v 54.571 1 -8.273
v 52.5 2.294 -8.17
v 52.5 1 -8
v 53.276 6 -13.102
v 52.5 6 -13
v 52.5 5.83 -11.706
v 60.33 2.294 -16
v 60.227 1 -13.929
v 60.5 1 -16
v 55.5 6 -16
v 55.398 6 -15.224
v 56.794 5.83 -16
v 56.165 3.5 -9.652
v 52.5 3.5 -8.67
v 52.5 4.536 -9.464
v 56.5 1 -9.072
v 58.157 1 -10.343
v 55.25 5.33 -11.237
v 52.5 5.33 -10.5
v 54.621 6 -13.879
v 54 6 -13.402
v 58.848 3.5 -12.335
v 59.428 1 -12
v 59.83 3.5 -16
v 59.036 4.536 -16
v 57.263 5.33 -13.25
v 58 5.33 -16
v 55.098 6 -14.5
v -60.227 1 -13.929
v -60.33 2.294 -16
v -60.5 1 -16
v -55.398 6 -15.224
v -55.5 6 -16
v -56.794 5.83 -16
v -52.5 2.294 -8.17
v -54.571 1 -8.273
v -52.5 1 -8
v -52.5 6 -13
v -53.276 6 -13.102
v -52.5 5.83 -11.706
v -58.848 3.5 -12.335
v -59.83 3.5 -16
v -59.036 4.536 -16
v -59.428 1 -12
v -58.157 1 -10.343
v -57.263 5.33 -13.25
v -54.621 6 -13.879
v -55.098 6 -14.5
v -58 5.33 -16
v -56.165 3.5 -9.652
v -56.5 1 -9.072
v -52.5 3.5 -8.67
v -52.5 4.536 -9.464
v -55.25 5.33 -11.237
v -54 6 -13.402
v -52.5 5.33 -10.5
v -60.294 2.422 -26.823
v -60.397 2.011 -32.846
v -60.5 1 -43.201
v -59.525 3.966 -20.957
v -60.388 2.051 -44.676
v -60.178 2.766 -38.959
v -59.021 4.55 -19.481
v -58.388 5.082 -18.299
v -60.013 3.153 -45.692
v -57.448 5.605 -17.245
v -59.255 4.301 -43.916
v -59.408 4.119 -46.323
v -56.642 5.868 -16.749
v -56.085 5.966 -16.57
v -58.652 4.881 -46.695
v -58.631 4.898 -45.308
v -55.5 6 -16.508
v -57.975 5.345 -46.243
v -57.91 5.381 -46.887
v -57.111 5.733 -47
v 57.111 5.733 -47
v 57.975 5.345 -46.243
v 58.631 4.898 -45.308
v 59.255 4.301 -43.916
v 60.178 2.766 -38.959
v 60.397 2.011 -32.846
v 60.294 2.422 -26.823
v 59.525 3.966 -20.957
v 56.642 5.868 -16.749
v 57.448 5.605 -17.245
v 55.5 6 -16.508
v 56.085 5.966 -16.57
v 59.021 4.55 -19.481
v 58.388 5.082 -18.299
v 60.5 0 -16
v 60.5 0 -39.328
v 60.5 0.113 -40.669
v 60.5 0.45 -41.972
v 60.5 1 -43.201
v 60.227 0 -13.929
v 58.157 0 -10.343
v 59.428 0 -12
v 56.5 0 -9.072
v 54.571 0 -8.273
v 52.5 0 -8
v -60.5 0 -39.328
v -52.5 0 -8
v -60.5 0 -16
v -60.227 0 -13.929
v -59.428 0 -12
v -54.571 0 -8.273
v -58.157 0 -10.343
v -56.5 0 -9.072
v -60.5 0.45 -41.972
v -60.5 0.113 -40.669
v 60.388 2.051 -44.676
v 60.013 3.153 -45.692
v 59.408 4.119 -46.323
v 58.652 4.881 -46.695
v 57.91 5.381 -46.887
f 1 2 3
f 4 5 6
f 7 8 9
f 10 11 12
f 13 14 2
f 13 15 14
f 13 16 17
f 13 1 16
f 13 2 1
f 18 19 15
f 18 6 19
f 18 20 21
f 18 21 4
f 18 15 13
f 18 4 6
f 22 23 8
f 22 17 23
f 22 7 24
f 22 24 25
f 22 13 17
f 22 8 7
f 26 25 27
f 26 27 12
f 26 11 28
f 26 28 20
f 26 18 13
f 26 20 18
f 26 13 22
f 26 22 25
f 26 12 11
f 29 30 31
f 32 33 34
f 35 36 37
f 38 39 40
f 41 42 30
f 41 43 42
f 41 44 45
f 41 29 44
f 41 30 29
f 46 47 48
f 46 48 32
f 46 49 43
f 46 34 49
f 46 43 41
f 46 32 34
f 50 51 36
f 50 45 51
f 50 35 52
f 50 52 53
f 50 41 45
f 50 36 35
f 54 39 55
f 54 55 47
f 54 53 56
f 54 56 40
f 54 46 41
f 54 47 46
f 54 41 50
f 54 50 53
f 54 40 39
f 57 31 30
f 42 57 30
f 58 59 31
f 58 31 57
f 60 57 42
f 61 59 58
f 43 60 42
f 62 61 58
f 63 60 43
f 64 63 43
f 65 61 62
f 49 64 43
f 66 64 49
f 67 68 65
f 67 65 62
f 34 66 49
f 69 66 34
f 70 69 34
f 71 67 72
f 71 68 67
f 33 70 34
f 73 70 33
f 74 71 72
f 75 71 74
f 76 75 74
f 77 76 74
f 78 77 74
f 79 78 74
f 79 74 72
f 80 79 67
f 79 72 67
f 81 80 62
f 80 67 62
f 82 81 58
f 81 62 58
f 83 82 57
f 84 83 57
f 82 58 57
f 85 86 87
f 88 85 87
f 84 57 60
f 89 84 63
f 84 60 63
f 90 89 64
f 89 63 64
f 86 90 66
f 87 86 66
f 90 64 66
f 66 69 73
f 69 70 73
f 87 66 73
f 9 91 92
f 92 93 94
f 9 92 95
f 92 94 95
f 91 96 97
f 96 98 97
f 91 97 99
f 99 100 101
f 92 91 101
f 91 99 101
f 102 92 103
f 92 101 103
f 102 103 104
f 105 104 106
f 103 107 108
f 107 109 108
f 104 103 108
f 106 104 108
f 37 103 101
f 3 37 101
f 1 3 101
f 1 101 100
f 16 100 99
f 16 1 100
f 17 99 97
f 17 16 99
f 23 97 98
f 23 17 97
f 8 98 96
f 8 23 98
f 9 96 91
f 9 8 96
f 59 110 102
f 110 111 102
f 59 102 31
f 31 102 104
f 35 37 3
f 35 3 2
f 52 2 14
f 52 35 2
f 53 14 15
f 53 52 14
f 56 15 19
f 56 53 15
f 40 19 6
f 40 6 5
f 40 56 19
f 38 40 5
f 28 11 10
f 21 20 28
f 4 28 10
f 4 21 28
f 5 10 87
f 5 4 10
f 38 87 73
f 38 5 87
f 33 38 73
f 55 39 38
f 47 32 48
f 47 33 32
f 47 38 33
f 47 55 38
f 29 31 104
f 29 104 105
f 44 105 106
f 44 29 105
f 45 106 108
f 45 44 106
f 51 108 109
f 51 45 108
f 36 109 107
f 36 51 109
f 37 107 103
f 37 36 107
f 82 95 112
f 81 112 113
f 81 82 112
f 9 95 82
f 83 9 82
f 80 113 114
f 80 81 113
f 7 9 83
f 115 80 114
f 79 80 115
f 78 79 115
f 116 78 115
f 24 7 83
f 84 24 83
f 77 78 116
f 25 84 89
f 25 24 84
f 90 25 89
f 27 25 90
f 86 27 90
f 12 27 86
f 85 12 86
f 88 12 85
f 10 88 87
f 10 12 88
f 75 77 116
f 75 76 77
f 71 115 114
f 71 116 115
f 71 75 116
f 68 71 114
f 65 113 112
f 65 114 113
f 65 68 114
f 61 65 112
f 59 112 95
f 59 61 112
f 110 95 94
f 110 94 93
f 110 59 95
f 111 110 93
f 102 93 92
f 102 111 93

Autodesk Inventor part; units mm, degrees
ref_plane "YZ Plane" through (0, 0, 0) normal (1, 0, 0) x (0, 1, 0)
ref_plane "XZ Plane" through (0, 0, 0) normal (0, 1, 0) x (-1, 0, 0)
ref_plane "XY Plane" through (0, 0, 0) normal (0, 0, 1) x (1, 0, 0)
sketch "Sketch1" plane through (0, 0, 0) normal (0, 1, 0) x (-1, 0, 0)
  line L0 (25.9, 0) -> (-25.9, 0) projected
  line L1 (0, -25.9) -> (0, 25.9) projected
  circle A0 centre (0, 0) radius 18.5 construction
  circle A1 centre (0, 0) radius 13 construction
  dimension "d0" = 37
  dimension "d1" = 26
sketch "Sketch2" plane through (0, 0, 0) normal (0, 1, 0) x (-1, 0, 0)
  line L0 (0, -28.9) -> (0, 26.4) projected
  line L1 (-60.5, -8) -> (-60.5, -21)
  line L2 (-60.5, -21) -> (60.5, -21)
  line L3 (60.5, -21) -> (60.5, -8)
  line L4 (60.5, -8) -> (-60.5, -8)
  line L5 (-84.7, 0) -> (84.7, 0) projected
  point P0 (0, 0)
  dimension "d3" = 121
  dimension "d99" = 8
  dimension "d101" = 21
extrude "Extrusion1" add sketch "Sketch2" along normal blind 6
sketch "Sketch6" plane through (0, 0, 0) normal (0, 1, 0) x (-1, 0, 0)
  line L0 (60.5, -21) -> (-60.5, -21) projected
  line L1 (60.5, -8) -> (60.5, -21) projected
  line L2 (-60.5, -21) -> (60.5, -21)
  line L3 (60.5, -21) -> (60.5, -8)
  line L4 (-60.5, -8) -> (-60.5, -21)
  line L5 (84.7, 0) -> (-84.7, 0) projected
  line L6 (0, -28.9) -> (0, 26.4) projected
  arc A0 (-16, 0) -> (16, 0) centre (0, 0) ccw
  line L7 (16, 0) -> (16, 0)
  line L8 (60.5, 0) -> (-60.5, 0) projected
  line L9 (16, 0) -> (60.5, 0)
  line L10 (-16, 0) -> (-16, 0)
  line L11 (-16, 0) -> (-60.5, 0)
  point P0 (-17.3617, -21)
  dimension "d18" = 32
extrude "Extrusion5" [suppressed]
sketch "Sketch4" plane through (0, 0, 0) normal (0, 0, 1) x (1, 0, 0)
  line L0 (-18.5, 0) -> (18.5, 0)
  line L1 (18.5, 0) -> (18.5, -2)
  line L2 (18.5, -2) -> (-18.5, -2)
  line L3 (-18.5, -2) -> (-18.5, 0)
  line L4 (-25.9, 0) -> (25.9, 0) projected
  line L5 (0, -2.4) -> (0, 0.4) projected
  point P0 (0, 0)
  dimension "d10" = 37
  dimension "d11" = 2
extrude "Extrusion6" [suppressed]
sketch "Sketch5" plane through (0, 0, 0) normal (0, 1, 0) x (-1, 0, 0)
  circle A0 centre (0, 0) radius 18.5 construction
  circle A1 centre (0, 0) radius 18.5 construction
  line L0 (25.9, 0) -> (-25.9, 0) projected
  line L1 (0, -28.9) -> (0, 26.4) projected
  line L2 (-18.5, -21) -> (18.5, -21)
  line L3 (18.5, -21) -> (18.5, -18.5)
  line L4 (18.5, -18.5) -> (-18.5, -18.5)
  line L5 (-18.5, -18.5) -> (-18.5, -21)
  dimension "d25" = 37
  dimension "d26" = 21
extrude "Extrusion7" [suppressed]
sketch "Sketch7" plane through (0, 0, 0) normal (0, 0, 1) x (1, 0, 0)
  line L0 (-18.5, 0) -> (18.5, 0)
  line L1 (18.5, 0) -> (18.5, -2)
  line L2 (18.5, -2) -> (-18.5, -2)
  line L3 (-18.5, -2) -> (-18.5, 0)
  line L4 (60.5, 0) -> (-60.5, 0) projected
  line L5 (-84.7, 0) -> (84.7, 0) projected
  line L6 (0, -2.4) -> (0, 0.4) projected
  point P0 (-16, 0)
  point P1 (16, 0)
  dimension "d53" = 2
  dimension "d54" = 18.5
extrude "Extrusion8" [suppressed]
sketch "Sketch8" plane through (0, 0, 0) normal (0, 1, 0) x (-1, 0, 0)
  circle A0 centre (0, 0) radius 12.75
  dimension "d34" = 25.5
extrude "Extrusion9" [suppressed]
pattern_linear "Rectangular Pattern1" [suppressed]
sketch "Sketch9" plane through (0, 6, 0) normal (0, 1, 0) x (1, 0, 0)
  circle A0 centre (0, 0) radius 13
  circle A1 centre (0, 0) radius 15
  dimension "d40" = 26
  dimension "d41" = 30
extrude "Extrusion10" [suppressed]
sketch "Sketch10" plane through (0, 5, 0) normal (0, 1, 0) x (1, 0, 0)
  arc A0 (16, 0) -> (-16, 0) centre (0, 0) ccw projected
  line L0 (1.5, -18) -> (-1.5, -18)
  line L1 (-29.4, 0) -> (29.4, 0) projected
  line L2 (0, 36.3) -> (0, -70.8) projected
  line L3 (1.5, -12) -> (-1.5, -12)
  line L4 (1.5, -12) -> (1.5, -18)
  line L5 (-1.5, -18) -> (-1.5, -12)
  dimension "d48" = 3
  dimension "d49" = 12
  dimension "d50" = 6
extrude "Extrusion11" [suppressed]
fillet "Fillet1" [suppressed]
sketch "Sketch11" plane through (0, 0, 0) normal (0, 1, 0) x (-1, 0, 0)
  line L0 (-60.5, -21) -> (60.5, -21)
  line L1 (60.5, -21) -> (60.5, -47)
  line L2 (60.5, -47) -> (-60.5, -47)
  line L3 (-60.5, -47) -> (-60.5, -21)
  line L4 (84.7, 0) -> (-84.7, 0) projected
  line L5 (0, -60.1) -> (0, 31.6) projected
  point P0 (0, 0)
  dimension "d57" = 26
  dimension "d58" = 21
  dimension "d59" = 121
extrude "Extrusion12" add sketch "Sketch11" along normal blind 6
sketch "Sketch12" plane through (0, 0, 0) normal (1, 0, 0) x (0, 1, 0)
  line L0 (6, -8) -> (6, -47) projected
  arc A0 (6, -16.5081) -> (5.7334, -47) centre (34, -32) ccw
  line L1 (-6.8, 0) -> (40.8, 0) projected
  line L2 (0, -66) -> (0, 67) projected
  line L3 (6, -16.5081) -> (6, -47)
  line L4 (6, -47) -> (5.7334, -47)
  line L5 (0, -47) -> (6, -47) projected
  point P0 (0, 0)
  point P1 (6, 48)
  dimension "d62" = 32
  dimension "d63" = 32
  dimension "d64" = 34
extrude "Extrusion13" cut sketch "Sketch12" along normal through all both and the other way through all
fillet "Fillet3" radius 8 1 edges at (0, 0, -47)
sketch "Sketch13" plane through (0, 0, 0) normal (0, 1, 0) x (-1, 0, 0)
  line L0 (84.7, 0) -> (-84.7, 0) projected
  line L1 (0, -57.9802) -> (0, 72.5866) projected
  line L2 (60.5, -8) -> (60.5, -39.3278) projected
  arc A0 (13.0815, 23.9185) -> (13.0815, 13.0815) centre (18.5, 18.5) ccw
  line L3 (-60.5, -8) -> (-60.5, -16.5081) projected
  arc A1 (-13.0815, 13.0815) -> (-13.0815, 23.9185) centre (-18.5, 18.5) ccw
  line L4 (18.5, 37) -> (18.5, 0)
  line L5 (-18.5, 0) -> (-18.5, 37)
  line L6 (18.5, 37) -> (18.5, -8)
  line L7 (-60.5, 0) -> (60.5, 0) projected
  line L8 (-18.5, -8) -> (-18.5, 37)
  arc A2 (-9.2871, 53) -> (-13.0815, 23.9185) centre (0, 37) ccw
  arc A3 (13.0815, 23.9185) -> (9.2871, 53) centre (0, 37) ccw
  arc A4 (-13.0815, 13.0815) -> (-18.5, 0) centre (0, 0) ccw
  arc A5 (18.5, 0) -> (13.0815, 13.0815) centre (0, 0) ccw
  point P0 (60.5, -39.3278)
  point P1 (-55.5, 48)
  point P2 (-60.5, -16.5081)
  dimension "d68" = 37
  dimension "d71" = 18.5
  dimension "d72" = 18.5
  dimension "d73" = 7.663
  dimension "d74" = 7.663
  dimension "d75" = 18.5
  dimension "d76" = 18.5
  dimension "d77" = 18.5
  dimension "d78" = 18.5
extrude "Extrusion14" [suppressed]
sketch "Sketch14" plane through (0, 0, 0) normal (0, 1, 0) x (-1, 0, 0)
  circle A0 centre (18.5, 18.5) radius 10
  line L0 (39.9, 0) -> (-39.9, 0) projected
  line L1 (0, -27.9) -> (0, 37.9) projected
  circle A1 centre (-18.5, 18.5) radius 10
  point P0 (0, 0)
  dimension "d84" = 18.5
  dimension "d85" = 18.5
  dimension "d86" = 20
  dimension "d89" = 37
extrude "Extrusion15" [suppressed]
fillet "Fillet4" [suppressed]
fillet "Fillet5" radius 8 2 edges at (-60.5, 3, -8) (60.5, 3, -8)
fillet "Fillet6" radius 5 5 edges at (58.1569, 6, -10.3431) (60.5, 6, -16.254) (-58.1569, 6, -10.3431) (-60.5, 6, -16.254) (0, 6, -8)
equation "\"d85\" = d84"
properties part number "NespressoSpeedfiller-6X-scraper"
